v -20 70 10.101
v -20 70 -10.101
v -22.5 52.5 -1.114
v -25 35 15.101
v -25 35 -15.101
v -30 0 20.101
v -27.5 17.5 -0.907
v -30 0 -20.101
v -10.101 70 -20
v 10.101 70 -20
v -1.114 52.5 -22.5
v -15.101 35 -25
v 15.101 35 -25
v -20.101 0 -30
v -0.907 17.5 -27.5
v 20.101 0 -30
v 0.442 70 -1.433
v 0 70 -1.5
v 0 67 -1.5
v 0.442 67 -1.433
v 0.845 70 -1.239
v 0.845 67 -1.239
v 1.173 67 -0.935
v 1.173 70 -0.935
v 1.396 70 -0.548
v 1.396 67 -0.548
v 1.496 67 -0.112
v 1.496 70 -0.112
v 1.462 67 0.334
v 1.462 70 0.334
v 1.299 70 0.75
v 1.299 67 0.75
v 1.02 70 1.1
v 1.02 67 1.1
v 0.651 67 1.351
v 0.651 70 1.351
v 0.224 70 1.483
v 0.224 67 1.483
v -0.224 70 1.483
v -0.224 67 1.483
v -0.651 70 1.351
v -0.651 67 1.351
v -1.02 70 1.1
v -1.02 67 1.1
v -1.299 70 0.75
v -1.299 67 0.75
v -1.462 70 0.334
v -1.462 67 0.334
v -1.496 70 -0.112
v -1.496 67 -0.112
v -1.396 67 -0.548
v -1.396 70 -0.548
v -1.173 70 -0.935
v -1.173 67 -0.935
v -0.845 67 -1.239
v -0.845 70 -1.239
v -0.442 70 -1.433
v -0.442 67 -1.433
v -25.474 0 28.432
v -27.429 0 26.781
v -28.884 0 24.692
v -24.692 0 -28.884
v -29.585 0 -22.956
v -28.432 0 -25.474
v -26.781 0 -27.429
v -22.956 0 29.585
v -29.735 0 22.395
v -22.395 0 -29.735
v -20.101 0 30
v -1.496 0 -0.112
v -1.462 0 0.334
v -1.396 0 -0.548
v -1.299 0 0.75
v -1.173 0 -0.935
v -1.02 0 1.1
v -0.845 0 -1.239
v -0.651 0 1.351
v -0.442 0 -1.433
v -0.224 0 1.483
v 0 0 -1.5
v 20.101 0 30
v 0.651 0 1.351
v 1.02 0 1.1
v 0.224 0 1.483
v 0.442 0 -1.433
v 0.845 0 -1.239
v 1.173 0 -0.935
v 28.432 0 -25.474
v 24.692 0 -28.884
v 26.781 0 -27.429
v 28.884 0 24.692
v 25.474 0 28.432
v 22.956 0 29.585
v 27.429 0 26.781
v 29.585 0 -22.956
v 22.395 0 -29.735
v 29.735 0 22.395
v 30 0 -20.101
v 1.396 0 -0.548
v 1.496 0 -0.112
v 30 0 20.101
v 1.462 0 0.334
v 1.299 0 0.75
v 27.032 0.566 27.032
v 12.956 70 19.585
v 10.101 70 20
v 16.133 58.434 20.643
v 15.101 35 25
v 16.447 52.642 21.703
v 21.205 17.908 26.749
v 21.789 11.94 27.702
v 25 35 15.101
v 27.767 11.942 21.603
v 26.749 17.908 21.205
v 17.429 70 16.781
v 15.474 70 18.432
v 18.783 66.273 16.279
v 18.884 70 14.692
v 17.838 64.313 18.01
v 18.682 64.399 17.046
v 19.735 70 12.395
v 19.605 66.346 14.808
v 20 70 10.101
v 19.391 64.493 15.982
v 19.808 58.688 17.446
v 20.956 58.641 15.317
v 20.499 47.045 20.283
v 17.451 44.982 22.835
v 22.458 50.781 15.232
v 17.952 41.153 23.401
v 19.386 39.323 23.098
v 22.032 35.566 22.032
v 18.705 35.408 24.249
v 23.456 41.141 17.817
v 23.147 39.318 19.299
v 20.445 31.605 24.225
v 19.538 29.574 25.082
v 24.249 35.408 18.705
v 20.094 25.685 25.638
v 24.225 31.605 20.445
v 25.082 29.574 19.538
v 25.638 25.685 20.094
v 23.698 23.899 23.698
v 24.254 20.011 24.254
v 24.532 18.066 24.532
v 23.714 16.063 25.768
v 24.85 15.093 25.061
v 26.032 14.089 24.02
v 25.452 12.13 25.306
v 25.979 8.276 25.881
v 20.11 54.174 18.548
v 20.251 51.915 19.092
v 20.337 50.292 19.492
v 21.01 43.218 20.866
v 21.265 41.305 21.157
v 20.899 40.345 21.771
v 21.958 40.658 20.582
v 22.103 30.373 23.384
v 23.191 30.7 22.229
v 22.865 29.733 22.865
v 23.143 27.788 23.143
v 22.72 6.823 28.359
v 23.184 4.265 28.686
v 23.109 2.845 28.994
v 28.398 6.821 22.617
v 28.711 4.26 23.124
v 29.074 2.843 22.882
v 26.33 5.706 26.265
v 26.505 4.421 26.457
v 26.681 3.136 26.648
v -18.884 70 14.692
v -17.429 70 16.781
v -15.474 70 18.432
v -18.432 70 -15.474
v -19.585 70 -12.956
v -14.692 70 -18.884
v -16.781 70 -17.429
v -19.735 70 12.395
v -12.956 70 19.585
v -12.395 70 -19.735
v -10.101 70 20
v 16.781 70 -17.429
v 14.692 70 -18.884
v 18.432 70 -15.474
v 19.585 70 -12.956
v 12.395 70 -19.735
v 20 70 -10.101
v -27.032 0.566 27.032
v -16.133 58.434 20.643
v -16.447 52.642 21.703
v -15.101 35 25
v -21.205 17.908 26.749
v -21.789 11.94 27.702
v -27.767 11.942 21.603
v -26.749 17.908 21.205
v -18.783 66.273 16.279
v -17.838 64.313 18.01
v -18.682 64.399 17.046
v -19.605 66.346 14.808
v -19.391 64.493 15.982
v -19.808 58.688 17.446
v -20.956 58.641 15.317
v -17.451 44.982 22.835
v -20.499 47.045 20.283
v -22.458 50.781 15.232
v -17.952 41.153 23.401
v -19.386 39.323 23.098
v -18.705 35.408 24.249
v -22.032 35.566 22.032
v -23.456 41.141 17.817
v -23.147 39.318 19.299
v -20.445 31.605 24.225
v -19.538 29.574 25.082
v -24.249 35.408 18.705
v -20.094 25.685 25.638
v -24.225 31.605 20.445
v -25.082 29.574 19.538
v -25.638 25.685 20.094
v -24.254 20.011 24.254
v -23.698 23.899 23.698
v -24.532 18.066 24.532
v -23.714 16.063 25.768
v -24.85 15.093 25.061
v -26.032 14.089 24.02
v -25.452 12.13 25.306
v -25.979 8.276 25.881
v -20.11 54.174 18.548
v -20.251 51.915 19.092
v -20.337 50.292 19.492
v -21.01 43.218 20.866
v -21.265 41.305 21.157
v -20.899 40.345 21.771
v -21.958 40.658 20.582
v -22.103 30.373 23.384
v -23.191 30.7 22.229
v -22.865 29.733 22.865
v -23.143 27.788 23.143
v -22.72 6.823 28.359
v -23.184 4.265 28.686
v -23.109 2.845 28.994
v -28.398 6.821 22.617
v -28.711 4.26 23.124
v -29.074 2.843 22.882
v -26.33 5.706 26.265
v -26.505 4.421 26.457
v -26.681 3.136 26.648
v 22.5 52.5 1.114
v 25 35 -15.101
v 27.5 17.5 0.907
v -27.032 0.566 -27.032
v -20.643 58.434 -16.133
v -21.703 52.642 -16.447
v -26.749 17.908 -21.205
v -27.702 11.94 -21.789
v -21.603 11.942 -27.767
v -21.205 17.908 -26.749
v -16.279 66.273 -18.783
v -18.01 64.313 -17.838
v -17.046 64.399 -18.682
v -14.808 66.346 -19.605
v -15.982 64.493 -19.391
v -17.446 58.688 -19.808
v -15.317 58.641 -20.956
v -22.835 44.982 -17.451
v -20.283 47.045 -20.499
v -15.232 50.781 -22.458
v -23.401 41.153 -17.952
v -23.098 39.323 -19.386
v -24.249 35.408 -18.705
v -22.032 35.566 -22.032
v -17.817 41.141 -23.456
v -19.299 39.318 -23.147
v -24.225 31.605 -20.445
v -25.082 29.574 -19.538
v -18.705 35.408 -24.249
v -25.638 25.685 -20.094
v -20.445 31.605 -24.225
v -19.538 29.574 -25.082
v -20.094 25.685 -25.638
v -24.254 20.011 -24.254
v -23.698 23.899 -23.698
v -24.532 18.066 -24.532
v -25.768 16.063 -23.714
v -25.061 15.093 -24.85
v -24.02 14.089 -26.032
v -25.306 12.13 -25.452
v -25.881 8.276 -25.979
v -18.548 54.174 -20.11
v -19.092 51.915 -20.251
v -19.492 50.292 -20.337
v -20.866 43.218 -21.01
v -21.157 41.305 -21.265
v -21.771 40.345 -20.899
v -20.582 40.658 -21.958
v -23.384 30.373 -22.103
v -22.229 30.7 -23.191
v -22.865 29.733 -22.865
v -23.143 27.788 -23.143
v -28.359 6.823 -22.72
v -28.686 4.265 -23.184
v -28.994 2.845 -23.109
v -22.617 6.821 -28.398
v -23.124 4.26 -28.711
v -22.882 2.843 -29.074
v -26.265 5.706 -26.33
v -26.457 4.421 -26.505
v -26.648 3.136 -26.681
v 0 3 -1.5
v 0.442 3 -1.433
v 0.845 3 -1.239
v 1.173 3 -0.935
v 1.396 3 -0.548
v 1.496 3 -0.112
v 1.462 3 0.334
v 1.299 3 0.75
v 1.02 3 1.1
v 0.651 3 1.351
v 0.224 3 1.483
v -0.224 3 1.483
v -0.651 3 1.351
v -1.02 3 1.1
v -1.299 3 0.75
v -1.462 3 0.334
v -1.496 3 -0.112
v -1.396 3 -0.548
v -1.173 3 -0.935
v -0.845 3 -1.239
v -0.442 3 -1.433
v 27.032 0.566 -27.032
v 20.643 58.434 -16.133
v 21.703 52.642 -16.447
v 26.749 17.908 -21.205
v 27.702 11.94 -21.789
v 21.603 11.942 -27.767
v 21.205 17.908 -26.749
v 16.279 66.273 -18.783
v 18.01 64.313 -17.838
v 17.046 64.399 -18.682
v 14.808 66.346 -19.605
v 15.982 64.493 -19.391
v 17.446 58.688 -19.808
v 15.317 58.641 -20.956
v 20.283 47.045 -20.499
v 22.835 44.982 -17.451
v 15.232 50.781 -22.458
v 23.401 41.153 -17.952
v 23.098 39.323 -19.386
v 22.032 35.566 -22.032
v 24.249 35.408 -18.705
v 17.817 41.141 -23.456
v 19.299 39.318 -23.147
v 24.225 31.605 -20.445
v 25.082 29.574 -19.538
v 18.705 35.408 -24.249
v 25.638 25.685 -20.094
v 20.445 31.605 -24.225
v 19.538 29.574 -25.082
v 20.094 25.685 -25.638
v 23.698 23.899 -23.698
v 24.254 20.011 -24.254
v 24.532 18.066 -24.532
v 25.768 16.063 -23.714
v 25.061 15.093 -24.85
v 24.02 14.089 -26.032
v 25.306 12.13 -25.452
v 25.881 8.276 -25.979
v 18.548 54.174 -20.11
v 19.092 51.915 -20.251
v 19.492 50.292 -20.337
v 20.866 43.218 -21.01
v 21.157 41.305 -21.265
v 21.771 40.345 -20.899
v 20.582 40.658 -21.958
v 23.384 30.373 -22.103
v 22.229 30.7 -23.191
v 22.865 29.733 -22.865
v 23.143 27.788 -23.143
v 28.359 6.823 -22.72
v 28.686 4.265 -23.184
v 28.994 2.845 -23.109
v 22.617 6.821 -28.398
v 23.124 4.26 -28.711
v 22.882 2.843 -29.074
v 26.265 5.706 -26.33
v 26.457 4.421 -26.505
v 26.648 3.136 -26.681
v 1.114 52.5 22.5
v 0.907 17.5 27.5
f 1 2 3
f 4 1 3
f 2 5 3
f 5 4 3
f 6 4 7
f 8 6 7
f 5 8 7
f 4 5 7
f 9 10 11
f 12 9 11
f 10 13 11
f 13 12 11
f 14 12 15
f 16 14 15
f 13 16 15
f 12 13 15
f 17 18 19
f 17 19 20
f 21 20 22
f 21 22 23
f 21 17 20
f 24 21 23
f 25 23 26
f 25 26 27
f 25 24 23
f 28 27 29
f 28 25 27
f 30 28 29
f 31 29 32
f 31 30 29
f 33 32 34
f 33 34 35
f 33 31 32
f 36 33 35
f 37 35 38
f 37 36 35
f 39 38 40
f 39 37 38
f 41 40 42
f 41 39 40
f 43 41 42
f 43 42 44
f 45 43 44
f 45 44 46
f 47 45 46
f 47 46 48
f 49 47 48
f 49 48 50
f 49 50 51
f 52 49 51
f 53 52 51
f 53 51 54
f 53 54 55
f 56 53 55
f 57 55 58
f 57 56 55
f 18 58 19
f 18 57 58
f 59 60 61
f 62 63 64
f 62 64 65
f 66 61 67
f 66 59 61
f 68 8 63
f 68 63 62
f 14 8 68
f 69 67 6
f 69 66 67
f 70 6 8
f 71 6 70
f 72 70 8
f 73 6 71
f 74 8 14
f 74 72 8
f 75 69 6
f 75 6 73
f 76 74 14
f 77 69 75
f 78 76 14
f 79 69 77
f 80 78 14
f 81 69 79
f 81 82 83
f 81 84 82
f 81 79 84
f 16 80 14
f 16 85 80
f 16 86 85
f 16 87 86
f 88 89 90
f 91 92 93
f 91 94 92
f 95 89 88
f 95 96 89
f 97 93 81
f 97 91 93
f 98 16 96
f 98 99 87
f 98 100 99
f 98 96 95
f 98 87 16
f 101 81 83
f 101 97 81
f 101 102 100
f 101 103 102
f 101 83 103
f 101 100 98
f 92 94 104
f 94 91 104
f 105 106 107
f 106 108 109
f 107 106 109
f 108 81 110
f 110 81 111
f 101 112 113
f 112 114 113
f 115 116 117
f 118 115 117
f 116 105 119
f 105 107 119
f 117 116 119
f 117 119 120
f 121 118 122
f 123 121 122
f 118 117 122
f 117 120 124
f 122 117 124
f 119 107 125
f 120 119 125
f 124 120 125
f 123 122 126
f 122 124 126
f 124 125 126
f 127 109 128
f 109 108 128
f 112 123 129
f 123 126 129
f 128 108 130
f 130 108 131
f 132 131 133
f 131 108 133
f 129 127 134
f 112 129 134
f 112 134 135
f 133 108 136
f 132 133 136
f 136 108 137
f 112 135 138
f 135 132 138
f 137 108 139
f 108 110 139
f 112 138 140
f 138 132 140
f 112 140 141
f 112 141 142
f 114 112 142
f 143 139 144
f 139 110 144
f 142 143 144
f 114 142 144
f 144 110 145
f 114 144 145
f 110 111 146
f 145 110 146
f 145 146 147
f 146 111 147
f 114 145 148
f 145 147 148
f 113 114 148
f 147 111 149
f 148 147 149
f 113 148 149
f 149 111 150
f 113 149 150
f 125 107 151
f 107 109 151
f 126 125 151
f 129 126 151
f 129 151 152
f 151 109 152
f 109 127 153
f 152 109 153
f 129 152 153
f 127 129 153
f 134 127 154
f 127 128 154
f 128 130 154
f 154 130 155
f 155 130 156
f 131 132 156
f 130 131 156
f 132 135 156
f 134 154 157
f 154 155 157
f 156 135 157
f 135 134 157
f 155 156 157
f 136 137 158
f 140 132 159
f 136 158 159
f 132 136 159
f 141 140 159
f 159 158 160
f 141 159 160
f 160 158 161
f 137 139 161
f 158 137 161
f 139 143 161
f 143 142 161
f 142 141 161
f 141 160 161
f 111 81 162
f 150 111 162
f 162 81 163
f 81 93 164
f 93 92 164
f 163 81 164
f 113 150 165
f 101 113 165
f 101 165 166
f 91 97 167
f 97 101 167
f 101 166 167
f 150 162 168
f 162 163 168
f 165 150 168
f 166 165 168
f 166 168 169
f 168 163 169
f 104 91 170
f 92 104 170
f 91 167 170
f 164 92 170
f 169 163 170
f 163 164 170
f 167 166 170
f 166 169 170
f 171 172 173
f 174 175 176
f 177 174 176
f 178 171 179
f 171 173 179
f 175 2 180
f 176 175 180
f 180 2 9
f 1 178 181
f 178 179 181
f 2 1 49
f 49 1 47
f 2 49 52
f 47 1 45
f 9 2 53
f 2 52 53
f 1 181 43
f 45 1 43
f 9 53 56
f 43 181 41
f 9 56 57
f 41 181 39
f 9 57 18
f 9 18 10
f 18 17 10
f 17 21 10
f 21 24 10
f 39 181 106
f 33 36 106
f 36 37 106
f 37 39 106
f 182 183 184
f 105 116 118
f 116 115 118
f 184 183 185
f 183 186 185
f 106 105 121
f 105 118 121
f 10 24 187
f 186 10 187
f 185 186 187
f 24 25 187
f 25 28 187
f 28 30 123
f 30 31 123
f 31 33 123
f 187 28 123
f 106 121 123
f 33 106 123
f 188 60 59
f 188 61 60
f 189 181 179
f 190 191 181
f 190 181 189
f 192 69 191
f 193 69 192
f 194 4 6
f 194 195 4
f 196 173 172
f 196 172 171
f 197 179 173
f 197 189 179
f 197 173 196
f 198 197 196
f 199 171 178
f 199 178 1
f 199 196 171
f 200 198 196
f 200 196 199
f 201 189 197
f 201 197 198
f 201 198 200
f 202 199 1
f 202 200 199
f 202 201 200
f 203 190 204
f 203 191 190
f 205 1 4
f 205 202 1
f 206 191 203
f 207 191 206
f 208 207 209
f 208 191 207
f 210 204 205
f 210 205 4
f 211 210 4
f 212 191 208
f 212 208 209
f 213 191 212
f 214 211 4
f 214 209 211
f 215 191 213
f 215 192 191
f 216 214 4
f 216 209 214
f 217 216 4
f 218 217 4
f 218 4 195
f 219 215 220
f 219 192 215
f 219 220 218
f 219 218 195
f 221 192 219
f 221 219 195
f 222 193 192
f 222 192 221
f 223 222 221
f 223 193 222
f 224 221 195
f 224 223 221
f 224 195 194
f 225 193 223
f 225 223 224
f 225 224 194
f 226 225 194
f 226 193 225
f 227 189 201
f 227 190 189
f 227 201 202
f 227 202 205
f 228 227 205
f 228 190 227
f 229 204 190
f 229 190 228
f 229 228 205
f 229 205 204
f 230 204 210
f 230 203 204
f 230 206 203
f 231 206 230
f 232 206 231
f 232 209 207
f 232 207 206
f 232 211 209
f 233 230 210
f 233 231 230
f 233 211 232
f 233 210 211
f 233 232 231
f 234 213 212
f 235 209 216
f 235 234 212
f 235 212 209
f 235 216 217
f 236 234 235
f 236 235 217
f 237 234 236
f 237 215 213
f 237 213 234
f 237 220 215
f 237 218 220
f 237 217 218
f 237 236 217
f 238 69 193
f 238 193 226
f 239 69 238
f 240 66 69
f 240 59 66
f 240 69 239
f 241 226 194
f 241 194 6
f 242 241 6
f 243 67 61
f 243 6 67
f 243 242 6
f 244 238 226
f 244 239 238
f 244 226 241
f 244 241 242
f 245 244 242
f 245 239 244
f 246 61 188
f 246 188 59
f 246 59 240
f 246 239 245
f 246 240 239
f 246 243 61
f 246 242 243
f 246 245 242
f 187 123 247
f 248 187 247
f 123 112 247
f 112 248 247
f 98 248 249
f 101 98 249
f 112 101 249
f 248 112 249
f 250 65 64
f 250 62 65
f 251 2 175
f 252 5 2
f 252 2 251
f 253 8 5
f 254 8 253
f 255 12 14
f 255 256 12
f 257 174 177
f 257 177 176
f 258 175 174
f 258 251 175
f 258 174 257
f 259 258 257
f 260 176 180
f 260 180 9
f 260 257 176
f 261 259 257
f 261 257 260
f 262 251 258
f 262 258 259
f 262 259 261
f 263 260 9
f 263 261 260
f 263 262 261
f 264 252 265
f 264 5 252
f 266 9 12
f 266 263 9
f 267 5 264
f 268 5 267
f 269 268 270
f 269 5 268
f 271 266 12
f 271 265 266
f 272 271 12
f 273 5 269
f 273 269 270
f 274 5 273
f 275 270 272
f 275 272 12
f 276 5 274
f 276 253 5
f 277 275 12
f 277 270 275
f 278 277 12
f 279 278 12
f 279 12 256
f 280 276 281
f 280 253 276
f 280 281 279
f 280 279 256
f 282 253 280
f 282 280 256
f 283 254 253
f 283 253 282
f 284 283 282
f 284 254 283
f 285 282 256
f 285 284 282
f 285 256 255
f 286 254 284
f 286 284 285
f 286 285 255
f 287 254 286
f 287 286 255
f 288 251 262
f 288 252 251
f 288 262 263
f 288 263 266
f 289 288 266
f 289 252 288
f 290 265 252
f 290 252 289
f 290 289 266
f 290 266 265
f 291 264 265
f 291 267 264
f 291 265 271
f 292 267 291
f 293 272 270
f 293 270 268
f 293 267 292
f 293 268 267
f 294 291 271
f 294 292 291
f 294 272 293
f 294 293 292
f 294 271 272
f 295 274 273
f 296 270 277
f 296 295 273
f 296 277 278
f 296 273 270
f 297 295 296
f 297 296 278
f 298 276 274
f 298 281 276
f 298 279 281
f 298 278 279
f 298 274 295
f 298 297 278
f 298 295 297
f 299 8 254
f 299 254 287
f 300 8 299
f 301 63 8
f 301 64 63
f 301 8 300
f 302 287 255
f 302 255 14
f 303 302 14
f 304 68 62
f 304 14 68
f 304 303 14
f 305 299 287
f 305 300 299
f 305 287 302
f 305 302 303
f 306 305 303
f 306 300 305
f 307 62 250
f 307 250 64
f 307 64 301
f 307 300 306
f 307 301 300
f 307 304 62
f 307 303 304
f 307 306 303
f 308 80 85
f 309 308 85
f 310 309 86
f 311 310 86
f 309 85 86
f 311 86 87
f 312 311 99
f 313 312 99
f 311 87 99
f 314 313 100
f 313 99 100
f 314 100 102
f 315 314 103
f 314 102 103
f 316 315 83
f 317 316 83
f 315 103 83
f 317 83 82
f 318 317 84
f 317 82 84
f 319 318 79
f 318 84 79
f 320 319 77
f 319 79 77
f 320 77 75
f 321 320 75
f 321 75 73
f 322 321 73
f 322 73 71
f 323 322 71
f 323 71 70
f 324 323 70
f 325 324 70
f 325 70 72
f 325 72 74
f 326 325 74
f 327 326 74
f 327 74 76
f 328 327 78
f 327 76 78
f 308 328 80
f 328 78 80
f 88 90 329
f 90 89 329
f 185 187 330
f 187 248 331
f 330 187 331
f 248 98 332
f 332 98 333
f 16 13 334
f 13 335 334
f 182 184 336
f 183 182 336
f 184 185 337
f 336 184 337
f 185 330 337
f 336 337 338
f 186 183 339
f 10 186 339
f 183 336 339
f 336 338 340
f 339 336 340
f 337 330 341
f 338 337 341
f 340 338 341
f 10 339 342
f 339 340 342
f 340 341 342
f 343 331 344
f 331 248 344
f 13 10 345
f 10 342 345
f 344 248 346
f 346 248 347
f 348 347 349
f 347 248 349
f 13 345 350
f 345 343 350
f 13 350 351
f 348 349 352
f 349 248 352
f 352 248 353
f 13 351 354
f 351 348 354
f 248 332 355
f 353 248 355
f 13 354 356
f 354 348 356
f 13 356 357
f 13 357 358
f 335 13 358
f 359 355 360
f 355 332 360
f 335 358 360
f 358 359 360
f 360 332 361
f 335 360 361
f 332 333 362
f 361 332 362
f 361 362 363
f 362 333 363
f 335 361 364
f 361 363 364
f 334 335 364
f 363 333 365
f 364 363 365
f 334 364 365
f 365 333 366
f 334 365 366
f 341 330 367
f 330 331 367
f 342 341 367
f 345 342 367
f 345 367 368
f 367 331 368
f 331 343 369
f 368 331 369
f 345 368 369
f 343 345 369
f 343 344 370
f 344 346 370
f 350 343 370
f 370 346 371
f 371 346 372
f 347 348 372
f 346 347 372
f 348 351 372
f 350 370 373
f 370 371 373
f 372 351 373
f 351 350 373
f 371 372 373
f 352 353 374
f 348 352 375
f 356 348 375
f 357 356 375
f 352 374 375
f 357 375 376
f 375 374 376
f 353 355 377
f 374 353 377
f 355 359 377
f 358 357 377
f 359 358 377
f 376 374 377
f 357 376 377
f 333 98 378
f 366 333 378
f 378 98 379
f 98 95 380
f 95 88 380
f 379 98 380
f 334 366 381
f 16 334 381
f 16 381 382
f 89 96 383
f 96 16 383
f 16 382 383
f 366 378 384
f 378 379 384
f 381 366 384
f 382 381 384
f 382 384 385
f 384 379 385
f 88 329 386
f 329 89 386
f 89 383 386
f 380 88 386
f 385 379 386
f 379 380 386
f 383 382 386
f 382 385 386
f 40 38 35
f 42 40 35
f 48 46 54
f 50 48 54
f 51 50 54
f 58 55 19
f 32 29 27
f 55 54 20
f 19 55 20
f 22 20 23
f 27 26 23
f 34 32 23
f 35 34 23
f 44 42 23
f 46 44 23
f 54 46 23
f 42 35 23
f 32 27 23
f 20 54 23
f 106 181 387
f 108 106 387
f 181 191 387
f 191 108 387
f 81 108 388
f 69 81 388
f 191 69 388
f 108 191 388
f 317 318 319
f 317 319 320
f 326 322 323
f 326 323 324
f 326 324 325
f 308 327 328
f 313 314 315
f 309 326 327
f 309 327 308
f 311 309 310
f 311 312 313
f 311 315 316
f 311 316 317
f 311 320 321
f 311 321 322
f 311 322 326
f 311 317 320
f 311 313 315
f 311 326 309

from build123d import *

# Parameters (mm, degrees)
SKETCH3_R          = 1.5
CUT_EXTRUDE1_DEPTH = 3
FILLET1_R          = 10


with BuildPart() as part:
    # Sketch2 → Loft1 section 0
    with BuildSketch(Plane(origin=(0, 70, 0), x_dir=(1, 0, 0), z_dir=(0, 1, 0))):
        with BuildLine():
            Line((-20, -20), (20, -20))
            Line((20, -20), (20, 20))
            Line((20, 20), (-20, 20))
            Line((-20, 20), (-20, -20))
        make_face()
    # Sketch1 → Loft1 section 1
    with BuildSketch(Plane(origin=(0, 0, 0), x_dir=(1, 0, 0), z_dir=(0, 1, 0))):
        with BuildLine():
            Line((-30, -30), (30, -30))
            Line((30, -30), (30, 30))
            Line((30, 30), (-30, 30))
            Line((-30, 30), (-30, -30))
        make_face()
    loft()

    # Sketch3 → Cut-Extrude1 (cut)
    with BuildSketch(Plane.XZ):
        with Locations(Location((0, 0, 0), (0, 0, 270))):
            Circle(SKETCH3_R)
    cut_extrude1 = extrude(amount=-CUT_EXTRUDE1_DEPTH, mode=Mode.SUBTRACT)

    # Mirror1: Cut-Extrude1 across plane
    add(cut_extrude1.mirror(Plane(origin=(0, 35, 0), x_dir=(0, 0, 1), z_dir=(0, -1, 0))), mode=Mode.SUBTRACT)

    # Fillet1
    fillet1_edges = [part.edges().sort_by_distance(p)[0] for p in [
        (-25, 35, -25),
        (25, 35, -25),
        (25, 35, 25),
        (-25, 35, 25),
    ]]
    fillet(fillet1_edges, radius=FILLET1_R)


solid = part.part
